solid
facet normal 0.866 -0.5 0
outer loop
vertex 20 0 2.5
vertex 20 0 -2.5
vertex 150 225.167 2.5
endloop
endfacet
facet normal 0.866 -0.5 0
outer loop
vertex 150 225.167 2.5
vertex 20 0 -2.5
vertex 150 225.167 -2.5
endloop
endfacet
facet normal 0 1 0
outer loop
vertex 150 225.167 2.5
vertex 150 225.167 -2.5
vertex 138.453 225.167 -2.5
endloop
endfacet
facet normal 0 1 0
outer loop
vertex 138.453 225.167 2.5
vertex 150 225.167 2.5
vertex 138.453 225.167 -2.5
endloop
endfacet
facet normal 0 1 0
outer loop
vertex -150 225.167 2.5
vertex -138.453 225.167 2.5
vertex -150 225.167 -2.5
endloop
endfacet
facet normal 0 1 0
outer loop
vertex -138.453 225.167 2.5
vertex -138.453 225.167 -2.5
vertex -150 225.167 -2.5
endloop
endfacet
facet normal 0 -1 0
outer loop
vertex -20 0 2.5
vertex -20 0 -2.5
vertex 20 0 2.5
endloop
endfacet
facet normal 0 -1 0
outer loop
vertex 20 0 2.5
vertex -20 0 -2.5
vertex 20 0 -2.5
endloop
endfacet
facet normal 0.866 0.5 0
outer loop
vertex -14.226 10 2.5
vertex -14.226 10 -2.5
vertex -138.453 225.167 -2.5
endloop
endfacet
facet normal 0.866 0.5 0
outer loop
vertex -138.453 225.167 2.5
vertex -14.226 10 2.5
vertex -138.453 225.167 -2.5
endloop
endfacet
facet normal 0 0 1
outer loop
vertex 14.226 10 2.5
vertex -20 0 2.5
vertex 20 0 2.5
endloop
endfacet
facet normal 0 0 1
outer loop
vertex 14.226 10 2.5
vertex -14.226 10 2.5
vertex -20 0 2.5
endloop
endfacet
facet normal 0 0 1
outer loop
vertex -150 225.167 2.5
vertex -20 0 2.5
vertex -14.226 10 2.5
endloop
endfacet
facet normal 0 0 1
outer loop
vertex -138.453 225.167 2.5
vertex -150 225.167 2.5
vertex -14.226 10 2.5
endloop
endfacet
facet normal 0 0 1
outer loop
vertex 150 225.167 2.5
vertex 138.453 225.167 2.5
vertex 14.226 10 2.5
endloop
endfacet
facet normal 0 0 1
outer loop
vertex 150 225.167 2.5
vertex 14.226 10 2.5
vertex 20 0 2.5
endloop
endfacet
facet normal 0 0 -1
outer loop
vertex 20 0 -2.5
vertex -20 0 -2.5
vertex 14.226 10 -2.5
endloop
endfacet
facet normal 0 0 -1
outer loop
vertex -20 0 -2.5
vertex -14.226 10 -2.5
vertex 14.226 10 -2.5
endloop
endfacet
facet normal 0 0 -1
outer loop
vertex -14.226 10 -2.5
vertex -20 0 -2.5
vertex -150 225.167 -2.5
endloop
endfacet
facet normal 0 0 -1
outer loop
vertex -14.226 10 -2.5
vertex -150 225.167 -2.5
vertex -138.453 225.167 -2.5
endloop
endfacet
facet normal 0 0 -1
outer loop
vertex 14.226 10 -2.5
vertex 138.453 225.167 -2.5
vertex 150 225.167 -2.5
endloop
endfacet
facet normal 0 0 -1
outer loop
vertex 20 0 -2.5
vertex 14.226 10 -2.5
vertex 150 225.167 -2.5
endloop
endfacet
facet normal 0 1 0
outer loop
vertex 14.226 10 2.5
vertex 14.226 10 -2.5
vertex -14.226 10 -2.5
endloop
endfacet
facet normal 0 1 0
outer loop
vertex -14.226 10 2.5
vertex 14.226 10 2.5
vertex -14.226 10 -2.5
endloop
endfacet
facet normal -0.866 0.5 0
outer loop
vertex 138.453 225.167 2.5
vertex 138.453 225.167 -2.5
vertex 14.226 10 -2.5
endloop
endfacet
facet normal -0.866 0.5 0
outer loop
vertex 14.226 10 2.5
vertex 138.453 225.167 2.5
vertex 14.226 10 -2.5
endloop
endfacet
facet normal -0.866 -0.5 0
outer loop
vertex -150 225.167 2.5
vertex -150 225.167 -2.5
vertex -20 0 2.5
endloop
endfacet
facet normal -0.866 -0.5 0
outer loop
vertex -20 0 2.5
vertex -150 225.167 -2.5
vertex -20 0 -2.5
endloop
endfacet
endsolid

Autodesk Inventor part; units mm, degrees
ref_plane "YZ Plane" through (0, 0, 0) normal (1, 0, 0) x (0, 1, 0)
ref_plane "XZ Plane" through (0, 0, 0) normal (0, 1, 0) x (-1, 0, 0)
sketch "Sketch1" plane through (0, 0, 0) normal (0, 0, 1) x (1, 0, 0)
  line L0 (0, 10) -> (-14.2265, 10)
  line L1 (-14.2265, 10) -> (-138.453, 225.1666)
  line L2 (-138.453, 225.1666) -> (-150, 225.1666)
  line L3 (-150, 225.1666) -> (-20, 0)
  line L4 (-20, 0) -> (0, 0)
  line L5 (0, 0) -> (0, 10)
  dimension "d0" = 260
  dimension "d1" = 30
  dimension "d2" = 10
  dimension "d3" = 10
  dimension "d4" = 20
extrude "Extrusion1" add sketch "Sketch1" along normal mid plane 5
mirror "Mirror1" about plane through (0, 0, 0) normal (1, 0, 0) of "Extrusion1"
ref_plane "Work Plane1" through (138.453, 225.1666, 2.5) normal (0, -1, 0) x (0, 0, -1)
sketch "Sketch2" plane through (138.453, 225.1666, 2.5) normal (0, -1, 0) x (0, 0, -1)
  line L0 (2.5, -348.453) -> (2.5, 71.547) construction
  line L1 (5, 0) -> (0, 0) construction
  line L2 (5, 11.547) -> (0, 11.547) construction
  line L3 (0, 0) -> (0, 11.547) construction
  line L4 (5, 11.547) -> (5, 0) construction
  line L5 (2.5, 11.547) -> (2.5, 0) construction
  line L6 (5, -276.906) -> (0, -276.906) construction
  line L7 (0, -276.906) -> (0, -288.453) construction
  line L8 (5, -288.453) -> (0, -288.453) construction
  line L9 (5, -288.453) -> (5, -276.906) construction
  line L10 (2.5, -276.906) -> (2.5, -288.453) construction
  line L11 (2.5, 5.7735) -> (2.5, -282.6795)
  line L12 (0, -288.453) -> (0, -158.453) construction
  point P0 (2.5, -138.453)
sketch "Sketch3" plane through (-20, 0, -2.5) normal (0, -1, 0) x (1, 0, 0)
  point P0 (20, 2.5)
  point P1 (20, 2.5)
properties part number "Braccetto"
